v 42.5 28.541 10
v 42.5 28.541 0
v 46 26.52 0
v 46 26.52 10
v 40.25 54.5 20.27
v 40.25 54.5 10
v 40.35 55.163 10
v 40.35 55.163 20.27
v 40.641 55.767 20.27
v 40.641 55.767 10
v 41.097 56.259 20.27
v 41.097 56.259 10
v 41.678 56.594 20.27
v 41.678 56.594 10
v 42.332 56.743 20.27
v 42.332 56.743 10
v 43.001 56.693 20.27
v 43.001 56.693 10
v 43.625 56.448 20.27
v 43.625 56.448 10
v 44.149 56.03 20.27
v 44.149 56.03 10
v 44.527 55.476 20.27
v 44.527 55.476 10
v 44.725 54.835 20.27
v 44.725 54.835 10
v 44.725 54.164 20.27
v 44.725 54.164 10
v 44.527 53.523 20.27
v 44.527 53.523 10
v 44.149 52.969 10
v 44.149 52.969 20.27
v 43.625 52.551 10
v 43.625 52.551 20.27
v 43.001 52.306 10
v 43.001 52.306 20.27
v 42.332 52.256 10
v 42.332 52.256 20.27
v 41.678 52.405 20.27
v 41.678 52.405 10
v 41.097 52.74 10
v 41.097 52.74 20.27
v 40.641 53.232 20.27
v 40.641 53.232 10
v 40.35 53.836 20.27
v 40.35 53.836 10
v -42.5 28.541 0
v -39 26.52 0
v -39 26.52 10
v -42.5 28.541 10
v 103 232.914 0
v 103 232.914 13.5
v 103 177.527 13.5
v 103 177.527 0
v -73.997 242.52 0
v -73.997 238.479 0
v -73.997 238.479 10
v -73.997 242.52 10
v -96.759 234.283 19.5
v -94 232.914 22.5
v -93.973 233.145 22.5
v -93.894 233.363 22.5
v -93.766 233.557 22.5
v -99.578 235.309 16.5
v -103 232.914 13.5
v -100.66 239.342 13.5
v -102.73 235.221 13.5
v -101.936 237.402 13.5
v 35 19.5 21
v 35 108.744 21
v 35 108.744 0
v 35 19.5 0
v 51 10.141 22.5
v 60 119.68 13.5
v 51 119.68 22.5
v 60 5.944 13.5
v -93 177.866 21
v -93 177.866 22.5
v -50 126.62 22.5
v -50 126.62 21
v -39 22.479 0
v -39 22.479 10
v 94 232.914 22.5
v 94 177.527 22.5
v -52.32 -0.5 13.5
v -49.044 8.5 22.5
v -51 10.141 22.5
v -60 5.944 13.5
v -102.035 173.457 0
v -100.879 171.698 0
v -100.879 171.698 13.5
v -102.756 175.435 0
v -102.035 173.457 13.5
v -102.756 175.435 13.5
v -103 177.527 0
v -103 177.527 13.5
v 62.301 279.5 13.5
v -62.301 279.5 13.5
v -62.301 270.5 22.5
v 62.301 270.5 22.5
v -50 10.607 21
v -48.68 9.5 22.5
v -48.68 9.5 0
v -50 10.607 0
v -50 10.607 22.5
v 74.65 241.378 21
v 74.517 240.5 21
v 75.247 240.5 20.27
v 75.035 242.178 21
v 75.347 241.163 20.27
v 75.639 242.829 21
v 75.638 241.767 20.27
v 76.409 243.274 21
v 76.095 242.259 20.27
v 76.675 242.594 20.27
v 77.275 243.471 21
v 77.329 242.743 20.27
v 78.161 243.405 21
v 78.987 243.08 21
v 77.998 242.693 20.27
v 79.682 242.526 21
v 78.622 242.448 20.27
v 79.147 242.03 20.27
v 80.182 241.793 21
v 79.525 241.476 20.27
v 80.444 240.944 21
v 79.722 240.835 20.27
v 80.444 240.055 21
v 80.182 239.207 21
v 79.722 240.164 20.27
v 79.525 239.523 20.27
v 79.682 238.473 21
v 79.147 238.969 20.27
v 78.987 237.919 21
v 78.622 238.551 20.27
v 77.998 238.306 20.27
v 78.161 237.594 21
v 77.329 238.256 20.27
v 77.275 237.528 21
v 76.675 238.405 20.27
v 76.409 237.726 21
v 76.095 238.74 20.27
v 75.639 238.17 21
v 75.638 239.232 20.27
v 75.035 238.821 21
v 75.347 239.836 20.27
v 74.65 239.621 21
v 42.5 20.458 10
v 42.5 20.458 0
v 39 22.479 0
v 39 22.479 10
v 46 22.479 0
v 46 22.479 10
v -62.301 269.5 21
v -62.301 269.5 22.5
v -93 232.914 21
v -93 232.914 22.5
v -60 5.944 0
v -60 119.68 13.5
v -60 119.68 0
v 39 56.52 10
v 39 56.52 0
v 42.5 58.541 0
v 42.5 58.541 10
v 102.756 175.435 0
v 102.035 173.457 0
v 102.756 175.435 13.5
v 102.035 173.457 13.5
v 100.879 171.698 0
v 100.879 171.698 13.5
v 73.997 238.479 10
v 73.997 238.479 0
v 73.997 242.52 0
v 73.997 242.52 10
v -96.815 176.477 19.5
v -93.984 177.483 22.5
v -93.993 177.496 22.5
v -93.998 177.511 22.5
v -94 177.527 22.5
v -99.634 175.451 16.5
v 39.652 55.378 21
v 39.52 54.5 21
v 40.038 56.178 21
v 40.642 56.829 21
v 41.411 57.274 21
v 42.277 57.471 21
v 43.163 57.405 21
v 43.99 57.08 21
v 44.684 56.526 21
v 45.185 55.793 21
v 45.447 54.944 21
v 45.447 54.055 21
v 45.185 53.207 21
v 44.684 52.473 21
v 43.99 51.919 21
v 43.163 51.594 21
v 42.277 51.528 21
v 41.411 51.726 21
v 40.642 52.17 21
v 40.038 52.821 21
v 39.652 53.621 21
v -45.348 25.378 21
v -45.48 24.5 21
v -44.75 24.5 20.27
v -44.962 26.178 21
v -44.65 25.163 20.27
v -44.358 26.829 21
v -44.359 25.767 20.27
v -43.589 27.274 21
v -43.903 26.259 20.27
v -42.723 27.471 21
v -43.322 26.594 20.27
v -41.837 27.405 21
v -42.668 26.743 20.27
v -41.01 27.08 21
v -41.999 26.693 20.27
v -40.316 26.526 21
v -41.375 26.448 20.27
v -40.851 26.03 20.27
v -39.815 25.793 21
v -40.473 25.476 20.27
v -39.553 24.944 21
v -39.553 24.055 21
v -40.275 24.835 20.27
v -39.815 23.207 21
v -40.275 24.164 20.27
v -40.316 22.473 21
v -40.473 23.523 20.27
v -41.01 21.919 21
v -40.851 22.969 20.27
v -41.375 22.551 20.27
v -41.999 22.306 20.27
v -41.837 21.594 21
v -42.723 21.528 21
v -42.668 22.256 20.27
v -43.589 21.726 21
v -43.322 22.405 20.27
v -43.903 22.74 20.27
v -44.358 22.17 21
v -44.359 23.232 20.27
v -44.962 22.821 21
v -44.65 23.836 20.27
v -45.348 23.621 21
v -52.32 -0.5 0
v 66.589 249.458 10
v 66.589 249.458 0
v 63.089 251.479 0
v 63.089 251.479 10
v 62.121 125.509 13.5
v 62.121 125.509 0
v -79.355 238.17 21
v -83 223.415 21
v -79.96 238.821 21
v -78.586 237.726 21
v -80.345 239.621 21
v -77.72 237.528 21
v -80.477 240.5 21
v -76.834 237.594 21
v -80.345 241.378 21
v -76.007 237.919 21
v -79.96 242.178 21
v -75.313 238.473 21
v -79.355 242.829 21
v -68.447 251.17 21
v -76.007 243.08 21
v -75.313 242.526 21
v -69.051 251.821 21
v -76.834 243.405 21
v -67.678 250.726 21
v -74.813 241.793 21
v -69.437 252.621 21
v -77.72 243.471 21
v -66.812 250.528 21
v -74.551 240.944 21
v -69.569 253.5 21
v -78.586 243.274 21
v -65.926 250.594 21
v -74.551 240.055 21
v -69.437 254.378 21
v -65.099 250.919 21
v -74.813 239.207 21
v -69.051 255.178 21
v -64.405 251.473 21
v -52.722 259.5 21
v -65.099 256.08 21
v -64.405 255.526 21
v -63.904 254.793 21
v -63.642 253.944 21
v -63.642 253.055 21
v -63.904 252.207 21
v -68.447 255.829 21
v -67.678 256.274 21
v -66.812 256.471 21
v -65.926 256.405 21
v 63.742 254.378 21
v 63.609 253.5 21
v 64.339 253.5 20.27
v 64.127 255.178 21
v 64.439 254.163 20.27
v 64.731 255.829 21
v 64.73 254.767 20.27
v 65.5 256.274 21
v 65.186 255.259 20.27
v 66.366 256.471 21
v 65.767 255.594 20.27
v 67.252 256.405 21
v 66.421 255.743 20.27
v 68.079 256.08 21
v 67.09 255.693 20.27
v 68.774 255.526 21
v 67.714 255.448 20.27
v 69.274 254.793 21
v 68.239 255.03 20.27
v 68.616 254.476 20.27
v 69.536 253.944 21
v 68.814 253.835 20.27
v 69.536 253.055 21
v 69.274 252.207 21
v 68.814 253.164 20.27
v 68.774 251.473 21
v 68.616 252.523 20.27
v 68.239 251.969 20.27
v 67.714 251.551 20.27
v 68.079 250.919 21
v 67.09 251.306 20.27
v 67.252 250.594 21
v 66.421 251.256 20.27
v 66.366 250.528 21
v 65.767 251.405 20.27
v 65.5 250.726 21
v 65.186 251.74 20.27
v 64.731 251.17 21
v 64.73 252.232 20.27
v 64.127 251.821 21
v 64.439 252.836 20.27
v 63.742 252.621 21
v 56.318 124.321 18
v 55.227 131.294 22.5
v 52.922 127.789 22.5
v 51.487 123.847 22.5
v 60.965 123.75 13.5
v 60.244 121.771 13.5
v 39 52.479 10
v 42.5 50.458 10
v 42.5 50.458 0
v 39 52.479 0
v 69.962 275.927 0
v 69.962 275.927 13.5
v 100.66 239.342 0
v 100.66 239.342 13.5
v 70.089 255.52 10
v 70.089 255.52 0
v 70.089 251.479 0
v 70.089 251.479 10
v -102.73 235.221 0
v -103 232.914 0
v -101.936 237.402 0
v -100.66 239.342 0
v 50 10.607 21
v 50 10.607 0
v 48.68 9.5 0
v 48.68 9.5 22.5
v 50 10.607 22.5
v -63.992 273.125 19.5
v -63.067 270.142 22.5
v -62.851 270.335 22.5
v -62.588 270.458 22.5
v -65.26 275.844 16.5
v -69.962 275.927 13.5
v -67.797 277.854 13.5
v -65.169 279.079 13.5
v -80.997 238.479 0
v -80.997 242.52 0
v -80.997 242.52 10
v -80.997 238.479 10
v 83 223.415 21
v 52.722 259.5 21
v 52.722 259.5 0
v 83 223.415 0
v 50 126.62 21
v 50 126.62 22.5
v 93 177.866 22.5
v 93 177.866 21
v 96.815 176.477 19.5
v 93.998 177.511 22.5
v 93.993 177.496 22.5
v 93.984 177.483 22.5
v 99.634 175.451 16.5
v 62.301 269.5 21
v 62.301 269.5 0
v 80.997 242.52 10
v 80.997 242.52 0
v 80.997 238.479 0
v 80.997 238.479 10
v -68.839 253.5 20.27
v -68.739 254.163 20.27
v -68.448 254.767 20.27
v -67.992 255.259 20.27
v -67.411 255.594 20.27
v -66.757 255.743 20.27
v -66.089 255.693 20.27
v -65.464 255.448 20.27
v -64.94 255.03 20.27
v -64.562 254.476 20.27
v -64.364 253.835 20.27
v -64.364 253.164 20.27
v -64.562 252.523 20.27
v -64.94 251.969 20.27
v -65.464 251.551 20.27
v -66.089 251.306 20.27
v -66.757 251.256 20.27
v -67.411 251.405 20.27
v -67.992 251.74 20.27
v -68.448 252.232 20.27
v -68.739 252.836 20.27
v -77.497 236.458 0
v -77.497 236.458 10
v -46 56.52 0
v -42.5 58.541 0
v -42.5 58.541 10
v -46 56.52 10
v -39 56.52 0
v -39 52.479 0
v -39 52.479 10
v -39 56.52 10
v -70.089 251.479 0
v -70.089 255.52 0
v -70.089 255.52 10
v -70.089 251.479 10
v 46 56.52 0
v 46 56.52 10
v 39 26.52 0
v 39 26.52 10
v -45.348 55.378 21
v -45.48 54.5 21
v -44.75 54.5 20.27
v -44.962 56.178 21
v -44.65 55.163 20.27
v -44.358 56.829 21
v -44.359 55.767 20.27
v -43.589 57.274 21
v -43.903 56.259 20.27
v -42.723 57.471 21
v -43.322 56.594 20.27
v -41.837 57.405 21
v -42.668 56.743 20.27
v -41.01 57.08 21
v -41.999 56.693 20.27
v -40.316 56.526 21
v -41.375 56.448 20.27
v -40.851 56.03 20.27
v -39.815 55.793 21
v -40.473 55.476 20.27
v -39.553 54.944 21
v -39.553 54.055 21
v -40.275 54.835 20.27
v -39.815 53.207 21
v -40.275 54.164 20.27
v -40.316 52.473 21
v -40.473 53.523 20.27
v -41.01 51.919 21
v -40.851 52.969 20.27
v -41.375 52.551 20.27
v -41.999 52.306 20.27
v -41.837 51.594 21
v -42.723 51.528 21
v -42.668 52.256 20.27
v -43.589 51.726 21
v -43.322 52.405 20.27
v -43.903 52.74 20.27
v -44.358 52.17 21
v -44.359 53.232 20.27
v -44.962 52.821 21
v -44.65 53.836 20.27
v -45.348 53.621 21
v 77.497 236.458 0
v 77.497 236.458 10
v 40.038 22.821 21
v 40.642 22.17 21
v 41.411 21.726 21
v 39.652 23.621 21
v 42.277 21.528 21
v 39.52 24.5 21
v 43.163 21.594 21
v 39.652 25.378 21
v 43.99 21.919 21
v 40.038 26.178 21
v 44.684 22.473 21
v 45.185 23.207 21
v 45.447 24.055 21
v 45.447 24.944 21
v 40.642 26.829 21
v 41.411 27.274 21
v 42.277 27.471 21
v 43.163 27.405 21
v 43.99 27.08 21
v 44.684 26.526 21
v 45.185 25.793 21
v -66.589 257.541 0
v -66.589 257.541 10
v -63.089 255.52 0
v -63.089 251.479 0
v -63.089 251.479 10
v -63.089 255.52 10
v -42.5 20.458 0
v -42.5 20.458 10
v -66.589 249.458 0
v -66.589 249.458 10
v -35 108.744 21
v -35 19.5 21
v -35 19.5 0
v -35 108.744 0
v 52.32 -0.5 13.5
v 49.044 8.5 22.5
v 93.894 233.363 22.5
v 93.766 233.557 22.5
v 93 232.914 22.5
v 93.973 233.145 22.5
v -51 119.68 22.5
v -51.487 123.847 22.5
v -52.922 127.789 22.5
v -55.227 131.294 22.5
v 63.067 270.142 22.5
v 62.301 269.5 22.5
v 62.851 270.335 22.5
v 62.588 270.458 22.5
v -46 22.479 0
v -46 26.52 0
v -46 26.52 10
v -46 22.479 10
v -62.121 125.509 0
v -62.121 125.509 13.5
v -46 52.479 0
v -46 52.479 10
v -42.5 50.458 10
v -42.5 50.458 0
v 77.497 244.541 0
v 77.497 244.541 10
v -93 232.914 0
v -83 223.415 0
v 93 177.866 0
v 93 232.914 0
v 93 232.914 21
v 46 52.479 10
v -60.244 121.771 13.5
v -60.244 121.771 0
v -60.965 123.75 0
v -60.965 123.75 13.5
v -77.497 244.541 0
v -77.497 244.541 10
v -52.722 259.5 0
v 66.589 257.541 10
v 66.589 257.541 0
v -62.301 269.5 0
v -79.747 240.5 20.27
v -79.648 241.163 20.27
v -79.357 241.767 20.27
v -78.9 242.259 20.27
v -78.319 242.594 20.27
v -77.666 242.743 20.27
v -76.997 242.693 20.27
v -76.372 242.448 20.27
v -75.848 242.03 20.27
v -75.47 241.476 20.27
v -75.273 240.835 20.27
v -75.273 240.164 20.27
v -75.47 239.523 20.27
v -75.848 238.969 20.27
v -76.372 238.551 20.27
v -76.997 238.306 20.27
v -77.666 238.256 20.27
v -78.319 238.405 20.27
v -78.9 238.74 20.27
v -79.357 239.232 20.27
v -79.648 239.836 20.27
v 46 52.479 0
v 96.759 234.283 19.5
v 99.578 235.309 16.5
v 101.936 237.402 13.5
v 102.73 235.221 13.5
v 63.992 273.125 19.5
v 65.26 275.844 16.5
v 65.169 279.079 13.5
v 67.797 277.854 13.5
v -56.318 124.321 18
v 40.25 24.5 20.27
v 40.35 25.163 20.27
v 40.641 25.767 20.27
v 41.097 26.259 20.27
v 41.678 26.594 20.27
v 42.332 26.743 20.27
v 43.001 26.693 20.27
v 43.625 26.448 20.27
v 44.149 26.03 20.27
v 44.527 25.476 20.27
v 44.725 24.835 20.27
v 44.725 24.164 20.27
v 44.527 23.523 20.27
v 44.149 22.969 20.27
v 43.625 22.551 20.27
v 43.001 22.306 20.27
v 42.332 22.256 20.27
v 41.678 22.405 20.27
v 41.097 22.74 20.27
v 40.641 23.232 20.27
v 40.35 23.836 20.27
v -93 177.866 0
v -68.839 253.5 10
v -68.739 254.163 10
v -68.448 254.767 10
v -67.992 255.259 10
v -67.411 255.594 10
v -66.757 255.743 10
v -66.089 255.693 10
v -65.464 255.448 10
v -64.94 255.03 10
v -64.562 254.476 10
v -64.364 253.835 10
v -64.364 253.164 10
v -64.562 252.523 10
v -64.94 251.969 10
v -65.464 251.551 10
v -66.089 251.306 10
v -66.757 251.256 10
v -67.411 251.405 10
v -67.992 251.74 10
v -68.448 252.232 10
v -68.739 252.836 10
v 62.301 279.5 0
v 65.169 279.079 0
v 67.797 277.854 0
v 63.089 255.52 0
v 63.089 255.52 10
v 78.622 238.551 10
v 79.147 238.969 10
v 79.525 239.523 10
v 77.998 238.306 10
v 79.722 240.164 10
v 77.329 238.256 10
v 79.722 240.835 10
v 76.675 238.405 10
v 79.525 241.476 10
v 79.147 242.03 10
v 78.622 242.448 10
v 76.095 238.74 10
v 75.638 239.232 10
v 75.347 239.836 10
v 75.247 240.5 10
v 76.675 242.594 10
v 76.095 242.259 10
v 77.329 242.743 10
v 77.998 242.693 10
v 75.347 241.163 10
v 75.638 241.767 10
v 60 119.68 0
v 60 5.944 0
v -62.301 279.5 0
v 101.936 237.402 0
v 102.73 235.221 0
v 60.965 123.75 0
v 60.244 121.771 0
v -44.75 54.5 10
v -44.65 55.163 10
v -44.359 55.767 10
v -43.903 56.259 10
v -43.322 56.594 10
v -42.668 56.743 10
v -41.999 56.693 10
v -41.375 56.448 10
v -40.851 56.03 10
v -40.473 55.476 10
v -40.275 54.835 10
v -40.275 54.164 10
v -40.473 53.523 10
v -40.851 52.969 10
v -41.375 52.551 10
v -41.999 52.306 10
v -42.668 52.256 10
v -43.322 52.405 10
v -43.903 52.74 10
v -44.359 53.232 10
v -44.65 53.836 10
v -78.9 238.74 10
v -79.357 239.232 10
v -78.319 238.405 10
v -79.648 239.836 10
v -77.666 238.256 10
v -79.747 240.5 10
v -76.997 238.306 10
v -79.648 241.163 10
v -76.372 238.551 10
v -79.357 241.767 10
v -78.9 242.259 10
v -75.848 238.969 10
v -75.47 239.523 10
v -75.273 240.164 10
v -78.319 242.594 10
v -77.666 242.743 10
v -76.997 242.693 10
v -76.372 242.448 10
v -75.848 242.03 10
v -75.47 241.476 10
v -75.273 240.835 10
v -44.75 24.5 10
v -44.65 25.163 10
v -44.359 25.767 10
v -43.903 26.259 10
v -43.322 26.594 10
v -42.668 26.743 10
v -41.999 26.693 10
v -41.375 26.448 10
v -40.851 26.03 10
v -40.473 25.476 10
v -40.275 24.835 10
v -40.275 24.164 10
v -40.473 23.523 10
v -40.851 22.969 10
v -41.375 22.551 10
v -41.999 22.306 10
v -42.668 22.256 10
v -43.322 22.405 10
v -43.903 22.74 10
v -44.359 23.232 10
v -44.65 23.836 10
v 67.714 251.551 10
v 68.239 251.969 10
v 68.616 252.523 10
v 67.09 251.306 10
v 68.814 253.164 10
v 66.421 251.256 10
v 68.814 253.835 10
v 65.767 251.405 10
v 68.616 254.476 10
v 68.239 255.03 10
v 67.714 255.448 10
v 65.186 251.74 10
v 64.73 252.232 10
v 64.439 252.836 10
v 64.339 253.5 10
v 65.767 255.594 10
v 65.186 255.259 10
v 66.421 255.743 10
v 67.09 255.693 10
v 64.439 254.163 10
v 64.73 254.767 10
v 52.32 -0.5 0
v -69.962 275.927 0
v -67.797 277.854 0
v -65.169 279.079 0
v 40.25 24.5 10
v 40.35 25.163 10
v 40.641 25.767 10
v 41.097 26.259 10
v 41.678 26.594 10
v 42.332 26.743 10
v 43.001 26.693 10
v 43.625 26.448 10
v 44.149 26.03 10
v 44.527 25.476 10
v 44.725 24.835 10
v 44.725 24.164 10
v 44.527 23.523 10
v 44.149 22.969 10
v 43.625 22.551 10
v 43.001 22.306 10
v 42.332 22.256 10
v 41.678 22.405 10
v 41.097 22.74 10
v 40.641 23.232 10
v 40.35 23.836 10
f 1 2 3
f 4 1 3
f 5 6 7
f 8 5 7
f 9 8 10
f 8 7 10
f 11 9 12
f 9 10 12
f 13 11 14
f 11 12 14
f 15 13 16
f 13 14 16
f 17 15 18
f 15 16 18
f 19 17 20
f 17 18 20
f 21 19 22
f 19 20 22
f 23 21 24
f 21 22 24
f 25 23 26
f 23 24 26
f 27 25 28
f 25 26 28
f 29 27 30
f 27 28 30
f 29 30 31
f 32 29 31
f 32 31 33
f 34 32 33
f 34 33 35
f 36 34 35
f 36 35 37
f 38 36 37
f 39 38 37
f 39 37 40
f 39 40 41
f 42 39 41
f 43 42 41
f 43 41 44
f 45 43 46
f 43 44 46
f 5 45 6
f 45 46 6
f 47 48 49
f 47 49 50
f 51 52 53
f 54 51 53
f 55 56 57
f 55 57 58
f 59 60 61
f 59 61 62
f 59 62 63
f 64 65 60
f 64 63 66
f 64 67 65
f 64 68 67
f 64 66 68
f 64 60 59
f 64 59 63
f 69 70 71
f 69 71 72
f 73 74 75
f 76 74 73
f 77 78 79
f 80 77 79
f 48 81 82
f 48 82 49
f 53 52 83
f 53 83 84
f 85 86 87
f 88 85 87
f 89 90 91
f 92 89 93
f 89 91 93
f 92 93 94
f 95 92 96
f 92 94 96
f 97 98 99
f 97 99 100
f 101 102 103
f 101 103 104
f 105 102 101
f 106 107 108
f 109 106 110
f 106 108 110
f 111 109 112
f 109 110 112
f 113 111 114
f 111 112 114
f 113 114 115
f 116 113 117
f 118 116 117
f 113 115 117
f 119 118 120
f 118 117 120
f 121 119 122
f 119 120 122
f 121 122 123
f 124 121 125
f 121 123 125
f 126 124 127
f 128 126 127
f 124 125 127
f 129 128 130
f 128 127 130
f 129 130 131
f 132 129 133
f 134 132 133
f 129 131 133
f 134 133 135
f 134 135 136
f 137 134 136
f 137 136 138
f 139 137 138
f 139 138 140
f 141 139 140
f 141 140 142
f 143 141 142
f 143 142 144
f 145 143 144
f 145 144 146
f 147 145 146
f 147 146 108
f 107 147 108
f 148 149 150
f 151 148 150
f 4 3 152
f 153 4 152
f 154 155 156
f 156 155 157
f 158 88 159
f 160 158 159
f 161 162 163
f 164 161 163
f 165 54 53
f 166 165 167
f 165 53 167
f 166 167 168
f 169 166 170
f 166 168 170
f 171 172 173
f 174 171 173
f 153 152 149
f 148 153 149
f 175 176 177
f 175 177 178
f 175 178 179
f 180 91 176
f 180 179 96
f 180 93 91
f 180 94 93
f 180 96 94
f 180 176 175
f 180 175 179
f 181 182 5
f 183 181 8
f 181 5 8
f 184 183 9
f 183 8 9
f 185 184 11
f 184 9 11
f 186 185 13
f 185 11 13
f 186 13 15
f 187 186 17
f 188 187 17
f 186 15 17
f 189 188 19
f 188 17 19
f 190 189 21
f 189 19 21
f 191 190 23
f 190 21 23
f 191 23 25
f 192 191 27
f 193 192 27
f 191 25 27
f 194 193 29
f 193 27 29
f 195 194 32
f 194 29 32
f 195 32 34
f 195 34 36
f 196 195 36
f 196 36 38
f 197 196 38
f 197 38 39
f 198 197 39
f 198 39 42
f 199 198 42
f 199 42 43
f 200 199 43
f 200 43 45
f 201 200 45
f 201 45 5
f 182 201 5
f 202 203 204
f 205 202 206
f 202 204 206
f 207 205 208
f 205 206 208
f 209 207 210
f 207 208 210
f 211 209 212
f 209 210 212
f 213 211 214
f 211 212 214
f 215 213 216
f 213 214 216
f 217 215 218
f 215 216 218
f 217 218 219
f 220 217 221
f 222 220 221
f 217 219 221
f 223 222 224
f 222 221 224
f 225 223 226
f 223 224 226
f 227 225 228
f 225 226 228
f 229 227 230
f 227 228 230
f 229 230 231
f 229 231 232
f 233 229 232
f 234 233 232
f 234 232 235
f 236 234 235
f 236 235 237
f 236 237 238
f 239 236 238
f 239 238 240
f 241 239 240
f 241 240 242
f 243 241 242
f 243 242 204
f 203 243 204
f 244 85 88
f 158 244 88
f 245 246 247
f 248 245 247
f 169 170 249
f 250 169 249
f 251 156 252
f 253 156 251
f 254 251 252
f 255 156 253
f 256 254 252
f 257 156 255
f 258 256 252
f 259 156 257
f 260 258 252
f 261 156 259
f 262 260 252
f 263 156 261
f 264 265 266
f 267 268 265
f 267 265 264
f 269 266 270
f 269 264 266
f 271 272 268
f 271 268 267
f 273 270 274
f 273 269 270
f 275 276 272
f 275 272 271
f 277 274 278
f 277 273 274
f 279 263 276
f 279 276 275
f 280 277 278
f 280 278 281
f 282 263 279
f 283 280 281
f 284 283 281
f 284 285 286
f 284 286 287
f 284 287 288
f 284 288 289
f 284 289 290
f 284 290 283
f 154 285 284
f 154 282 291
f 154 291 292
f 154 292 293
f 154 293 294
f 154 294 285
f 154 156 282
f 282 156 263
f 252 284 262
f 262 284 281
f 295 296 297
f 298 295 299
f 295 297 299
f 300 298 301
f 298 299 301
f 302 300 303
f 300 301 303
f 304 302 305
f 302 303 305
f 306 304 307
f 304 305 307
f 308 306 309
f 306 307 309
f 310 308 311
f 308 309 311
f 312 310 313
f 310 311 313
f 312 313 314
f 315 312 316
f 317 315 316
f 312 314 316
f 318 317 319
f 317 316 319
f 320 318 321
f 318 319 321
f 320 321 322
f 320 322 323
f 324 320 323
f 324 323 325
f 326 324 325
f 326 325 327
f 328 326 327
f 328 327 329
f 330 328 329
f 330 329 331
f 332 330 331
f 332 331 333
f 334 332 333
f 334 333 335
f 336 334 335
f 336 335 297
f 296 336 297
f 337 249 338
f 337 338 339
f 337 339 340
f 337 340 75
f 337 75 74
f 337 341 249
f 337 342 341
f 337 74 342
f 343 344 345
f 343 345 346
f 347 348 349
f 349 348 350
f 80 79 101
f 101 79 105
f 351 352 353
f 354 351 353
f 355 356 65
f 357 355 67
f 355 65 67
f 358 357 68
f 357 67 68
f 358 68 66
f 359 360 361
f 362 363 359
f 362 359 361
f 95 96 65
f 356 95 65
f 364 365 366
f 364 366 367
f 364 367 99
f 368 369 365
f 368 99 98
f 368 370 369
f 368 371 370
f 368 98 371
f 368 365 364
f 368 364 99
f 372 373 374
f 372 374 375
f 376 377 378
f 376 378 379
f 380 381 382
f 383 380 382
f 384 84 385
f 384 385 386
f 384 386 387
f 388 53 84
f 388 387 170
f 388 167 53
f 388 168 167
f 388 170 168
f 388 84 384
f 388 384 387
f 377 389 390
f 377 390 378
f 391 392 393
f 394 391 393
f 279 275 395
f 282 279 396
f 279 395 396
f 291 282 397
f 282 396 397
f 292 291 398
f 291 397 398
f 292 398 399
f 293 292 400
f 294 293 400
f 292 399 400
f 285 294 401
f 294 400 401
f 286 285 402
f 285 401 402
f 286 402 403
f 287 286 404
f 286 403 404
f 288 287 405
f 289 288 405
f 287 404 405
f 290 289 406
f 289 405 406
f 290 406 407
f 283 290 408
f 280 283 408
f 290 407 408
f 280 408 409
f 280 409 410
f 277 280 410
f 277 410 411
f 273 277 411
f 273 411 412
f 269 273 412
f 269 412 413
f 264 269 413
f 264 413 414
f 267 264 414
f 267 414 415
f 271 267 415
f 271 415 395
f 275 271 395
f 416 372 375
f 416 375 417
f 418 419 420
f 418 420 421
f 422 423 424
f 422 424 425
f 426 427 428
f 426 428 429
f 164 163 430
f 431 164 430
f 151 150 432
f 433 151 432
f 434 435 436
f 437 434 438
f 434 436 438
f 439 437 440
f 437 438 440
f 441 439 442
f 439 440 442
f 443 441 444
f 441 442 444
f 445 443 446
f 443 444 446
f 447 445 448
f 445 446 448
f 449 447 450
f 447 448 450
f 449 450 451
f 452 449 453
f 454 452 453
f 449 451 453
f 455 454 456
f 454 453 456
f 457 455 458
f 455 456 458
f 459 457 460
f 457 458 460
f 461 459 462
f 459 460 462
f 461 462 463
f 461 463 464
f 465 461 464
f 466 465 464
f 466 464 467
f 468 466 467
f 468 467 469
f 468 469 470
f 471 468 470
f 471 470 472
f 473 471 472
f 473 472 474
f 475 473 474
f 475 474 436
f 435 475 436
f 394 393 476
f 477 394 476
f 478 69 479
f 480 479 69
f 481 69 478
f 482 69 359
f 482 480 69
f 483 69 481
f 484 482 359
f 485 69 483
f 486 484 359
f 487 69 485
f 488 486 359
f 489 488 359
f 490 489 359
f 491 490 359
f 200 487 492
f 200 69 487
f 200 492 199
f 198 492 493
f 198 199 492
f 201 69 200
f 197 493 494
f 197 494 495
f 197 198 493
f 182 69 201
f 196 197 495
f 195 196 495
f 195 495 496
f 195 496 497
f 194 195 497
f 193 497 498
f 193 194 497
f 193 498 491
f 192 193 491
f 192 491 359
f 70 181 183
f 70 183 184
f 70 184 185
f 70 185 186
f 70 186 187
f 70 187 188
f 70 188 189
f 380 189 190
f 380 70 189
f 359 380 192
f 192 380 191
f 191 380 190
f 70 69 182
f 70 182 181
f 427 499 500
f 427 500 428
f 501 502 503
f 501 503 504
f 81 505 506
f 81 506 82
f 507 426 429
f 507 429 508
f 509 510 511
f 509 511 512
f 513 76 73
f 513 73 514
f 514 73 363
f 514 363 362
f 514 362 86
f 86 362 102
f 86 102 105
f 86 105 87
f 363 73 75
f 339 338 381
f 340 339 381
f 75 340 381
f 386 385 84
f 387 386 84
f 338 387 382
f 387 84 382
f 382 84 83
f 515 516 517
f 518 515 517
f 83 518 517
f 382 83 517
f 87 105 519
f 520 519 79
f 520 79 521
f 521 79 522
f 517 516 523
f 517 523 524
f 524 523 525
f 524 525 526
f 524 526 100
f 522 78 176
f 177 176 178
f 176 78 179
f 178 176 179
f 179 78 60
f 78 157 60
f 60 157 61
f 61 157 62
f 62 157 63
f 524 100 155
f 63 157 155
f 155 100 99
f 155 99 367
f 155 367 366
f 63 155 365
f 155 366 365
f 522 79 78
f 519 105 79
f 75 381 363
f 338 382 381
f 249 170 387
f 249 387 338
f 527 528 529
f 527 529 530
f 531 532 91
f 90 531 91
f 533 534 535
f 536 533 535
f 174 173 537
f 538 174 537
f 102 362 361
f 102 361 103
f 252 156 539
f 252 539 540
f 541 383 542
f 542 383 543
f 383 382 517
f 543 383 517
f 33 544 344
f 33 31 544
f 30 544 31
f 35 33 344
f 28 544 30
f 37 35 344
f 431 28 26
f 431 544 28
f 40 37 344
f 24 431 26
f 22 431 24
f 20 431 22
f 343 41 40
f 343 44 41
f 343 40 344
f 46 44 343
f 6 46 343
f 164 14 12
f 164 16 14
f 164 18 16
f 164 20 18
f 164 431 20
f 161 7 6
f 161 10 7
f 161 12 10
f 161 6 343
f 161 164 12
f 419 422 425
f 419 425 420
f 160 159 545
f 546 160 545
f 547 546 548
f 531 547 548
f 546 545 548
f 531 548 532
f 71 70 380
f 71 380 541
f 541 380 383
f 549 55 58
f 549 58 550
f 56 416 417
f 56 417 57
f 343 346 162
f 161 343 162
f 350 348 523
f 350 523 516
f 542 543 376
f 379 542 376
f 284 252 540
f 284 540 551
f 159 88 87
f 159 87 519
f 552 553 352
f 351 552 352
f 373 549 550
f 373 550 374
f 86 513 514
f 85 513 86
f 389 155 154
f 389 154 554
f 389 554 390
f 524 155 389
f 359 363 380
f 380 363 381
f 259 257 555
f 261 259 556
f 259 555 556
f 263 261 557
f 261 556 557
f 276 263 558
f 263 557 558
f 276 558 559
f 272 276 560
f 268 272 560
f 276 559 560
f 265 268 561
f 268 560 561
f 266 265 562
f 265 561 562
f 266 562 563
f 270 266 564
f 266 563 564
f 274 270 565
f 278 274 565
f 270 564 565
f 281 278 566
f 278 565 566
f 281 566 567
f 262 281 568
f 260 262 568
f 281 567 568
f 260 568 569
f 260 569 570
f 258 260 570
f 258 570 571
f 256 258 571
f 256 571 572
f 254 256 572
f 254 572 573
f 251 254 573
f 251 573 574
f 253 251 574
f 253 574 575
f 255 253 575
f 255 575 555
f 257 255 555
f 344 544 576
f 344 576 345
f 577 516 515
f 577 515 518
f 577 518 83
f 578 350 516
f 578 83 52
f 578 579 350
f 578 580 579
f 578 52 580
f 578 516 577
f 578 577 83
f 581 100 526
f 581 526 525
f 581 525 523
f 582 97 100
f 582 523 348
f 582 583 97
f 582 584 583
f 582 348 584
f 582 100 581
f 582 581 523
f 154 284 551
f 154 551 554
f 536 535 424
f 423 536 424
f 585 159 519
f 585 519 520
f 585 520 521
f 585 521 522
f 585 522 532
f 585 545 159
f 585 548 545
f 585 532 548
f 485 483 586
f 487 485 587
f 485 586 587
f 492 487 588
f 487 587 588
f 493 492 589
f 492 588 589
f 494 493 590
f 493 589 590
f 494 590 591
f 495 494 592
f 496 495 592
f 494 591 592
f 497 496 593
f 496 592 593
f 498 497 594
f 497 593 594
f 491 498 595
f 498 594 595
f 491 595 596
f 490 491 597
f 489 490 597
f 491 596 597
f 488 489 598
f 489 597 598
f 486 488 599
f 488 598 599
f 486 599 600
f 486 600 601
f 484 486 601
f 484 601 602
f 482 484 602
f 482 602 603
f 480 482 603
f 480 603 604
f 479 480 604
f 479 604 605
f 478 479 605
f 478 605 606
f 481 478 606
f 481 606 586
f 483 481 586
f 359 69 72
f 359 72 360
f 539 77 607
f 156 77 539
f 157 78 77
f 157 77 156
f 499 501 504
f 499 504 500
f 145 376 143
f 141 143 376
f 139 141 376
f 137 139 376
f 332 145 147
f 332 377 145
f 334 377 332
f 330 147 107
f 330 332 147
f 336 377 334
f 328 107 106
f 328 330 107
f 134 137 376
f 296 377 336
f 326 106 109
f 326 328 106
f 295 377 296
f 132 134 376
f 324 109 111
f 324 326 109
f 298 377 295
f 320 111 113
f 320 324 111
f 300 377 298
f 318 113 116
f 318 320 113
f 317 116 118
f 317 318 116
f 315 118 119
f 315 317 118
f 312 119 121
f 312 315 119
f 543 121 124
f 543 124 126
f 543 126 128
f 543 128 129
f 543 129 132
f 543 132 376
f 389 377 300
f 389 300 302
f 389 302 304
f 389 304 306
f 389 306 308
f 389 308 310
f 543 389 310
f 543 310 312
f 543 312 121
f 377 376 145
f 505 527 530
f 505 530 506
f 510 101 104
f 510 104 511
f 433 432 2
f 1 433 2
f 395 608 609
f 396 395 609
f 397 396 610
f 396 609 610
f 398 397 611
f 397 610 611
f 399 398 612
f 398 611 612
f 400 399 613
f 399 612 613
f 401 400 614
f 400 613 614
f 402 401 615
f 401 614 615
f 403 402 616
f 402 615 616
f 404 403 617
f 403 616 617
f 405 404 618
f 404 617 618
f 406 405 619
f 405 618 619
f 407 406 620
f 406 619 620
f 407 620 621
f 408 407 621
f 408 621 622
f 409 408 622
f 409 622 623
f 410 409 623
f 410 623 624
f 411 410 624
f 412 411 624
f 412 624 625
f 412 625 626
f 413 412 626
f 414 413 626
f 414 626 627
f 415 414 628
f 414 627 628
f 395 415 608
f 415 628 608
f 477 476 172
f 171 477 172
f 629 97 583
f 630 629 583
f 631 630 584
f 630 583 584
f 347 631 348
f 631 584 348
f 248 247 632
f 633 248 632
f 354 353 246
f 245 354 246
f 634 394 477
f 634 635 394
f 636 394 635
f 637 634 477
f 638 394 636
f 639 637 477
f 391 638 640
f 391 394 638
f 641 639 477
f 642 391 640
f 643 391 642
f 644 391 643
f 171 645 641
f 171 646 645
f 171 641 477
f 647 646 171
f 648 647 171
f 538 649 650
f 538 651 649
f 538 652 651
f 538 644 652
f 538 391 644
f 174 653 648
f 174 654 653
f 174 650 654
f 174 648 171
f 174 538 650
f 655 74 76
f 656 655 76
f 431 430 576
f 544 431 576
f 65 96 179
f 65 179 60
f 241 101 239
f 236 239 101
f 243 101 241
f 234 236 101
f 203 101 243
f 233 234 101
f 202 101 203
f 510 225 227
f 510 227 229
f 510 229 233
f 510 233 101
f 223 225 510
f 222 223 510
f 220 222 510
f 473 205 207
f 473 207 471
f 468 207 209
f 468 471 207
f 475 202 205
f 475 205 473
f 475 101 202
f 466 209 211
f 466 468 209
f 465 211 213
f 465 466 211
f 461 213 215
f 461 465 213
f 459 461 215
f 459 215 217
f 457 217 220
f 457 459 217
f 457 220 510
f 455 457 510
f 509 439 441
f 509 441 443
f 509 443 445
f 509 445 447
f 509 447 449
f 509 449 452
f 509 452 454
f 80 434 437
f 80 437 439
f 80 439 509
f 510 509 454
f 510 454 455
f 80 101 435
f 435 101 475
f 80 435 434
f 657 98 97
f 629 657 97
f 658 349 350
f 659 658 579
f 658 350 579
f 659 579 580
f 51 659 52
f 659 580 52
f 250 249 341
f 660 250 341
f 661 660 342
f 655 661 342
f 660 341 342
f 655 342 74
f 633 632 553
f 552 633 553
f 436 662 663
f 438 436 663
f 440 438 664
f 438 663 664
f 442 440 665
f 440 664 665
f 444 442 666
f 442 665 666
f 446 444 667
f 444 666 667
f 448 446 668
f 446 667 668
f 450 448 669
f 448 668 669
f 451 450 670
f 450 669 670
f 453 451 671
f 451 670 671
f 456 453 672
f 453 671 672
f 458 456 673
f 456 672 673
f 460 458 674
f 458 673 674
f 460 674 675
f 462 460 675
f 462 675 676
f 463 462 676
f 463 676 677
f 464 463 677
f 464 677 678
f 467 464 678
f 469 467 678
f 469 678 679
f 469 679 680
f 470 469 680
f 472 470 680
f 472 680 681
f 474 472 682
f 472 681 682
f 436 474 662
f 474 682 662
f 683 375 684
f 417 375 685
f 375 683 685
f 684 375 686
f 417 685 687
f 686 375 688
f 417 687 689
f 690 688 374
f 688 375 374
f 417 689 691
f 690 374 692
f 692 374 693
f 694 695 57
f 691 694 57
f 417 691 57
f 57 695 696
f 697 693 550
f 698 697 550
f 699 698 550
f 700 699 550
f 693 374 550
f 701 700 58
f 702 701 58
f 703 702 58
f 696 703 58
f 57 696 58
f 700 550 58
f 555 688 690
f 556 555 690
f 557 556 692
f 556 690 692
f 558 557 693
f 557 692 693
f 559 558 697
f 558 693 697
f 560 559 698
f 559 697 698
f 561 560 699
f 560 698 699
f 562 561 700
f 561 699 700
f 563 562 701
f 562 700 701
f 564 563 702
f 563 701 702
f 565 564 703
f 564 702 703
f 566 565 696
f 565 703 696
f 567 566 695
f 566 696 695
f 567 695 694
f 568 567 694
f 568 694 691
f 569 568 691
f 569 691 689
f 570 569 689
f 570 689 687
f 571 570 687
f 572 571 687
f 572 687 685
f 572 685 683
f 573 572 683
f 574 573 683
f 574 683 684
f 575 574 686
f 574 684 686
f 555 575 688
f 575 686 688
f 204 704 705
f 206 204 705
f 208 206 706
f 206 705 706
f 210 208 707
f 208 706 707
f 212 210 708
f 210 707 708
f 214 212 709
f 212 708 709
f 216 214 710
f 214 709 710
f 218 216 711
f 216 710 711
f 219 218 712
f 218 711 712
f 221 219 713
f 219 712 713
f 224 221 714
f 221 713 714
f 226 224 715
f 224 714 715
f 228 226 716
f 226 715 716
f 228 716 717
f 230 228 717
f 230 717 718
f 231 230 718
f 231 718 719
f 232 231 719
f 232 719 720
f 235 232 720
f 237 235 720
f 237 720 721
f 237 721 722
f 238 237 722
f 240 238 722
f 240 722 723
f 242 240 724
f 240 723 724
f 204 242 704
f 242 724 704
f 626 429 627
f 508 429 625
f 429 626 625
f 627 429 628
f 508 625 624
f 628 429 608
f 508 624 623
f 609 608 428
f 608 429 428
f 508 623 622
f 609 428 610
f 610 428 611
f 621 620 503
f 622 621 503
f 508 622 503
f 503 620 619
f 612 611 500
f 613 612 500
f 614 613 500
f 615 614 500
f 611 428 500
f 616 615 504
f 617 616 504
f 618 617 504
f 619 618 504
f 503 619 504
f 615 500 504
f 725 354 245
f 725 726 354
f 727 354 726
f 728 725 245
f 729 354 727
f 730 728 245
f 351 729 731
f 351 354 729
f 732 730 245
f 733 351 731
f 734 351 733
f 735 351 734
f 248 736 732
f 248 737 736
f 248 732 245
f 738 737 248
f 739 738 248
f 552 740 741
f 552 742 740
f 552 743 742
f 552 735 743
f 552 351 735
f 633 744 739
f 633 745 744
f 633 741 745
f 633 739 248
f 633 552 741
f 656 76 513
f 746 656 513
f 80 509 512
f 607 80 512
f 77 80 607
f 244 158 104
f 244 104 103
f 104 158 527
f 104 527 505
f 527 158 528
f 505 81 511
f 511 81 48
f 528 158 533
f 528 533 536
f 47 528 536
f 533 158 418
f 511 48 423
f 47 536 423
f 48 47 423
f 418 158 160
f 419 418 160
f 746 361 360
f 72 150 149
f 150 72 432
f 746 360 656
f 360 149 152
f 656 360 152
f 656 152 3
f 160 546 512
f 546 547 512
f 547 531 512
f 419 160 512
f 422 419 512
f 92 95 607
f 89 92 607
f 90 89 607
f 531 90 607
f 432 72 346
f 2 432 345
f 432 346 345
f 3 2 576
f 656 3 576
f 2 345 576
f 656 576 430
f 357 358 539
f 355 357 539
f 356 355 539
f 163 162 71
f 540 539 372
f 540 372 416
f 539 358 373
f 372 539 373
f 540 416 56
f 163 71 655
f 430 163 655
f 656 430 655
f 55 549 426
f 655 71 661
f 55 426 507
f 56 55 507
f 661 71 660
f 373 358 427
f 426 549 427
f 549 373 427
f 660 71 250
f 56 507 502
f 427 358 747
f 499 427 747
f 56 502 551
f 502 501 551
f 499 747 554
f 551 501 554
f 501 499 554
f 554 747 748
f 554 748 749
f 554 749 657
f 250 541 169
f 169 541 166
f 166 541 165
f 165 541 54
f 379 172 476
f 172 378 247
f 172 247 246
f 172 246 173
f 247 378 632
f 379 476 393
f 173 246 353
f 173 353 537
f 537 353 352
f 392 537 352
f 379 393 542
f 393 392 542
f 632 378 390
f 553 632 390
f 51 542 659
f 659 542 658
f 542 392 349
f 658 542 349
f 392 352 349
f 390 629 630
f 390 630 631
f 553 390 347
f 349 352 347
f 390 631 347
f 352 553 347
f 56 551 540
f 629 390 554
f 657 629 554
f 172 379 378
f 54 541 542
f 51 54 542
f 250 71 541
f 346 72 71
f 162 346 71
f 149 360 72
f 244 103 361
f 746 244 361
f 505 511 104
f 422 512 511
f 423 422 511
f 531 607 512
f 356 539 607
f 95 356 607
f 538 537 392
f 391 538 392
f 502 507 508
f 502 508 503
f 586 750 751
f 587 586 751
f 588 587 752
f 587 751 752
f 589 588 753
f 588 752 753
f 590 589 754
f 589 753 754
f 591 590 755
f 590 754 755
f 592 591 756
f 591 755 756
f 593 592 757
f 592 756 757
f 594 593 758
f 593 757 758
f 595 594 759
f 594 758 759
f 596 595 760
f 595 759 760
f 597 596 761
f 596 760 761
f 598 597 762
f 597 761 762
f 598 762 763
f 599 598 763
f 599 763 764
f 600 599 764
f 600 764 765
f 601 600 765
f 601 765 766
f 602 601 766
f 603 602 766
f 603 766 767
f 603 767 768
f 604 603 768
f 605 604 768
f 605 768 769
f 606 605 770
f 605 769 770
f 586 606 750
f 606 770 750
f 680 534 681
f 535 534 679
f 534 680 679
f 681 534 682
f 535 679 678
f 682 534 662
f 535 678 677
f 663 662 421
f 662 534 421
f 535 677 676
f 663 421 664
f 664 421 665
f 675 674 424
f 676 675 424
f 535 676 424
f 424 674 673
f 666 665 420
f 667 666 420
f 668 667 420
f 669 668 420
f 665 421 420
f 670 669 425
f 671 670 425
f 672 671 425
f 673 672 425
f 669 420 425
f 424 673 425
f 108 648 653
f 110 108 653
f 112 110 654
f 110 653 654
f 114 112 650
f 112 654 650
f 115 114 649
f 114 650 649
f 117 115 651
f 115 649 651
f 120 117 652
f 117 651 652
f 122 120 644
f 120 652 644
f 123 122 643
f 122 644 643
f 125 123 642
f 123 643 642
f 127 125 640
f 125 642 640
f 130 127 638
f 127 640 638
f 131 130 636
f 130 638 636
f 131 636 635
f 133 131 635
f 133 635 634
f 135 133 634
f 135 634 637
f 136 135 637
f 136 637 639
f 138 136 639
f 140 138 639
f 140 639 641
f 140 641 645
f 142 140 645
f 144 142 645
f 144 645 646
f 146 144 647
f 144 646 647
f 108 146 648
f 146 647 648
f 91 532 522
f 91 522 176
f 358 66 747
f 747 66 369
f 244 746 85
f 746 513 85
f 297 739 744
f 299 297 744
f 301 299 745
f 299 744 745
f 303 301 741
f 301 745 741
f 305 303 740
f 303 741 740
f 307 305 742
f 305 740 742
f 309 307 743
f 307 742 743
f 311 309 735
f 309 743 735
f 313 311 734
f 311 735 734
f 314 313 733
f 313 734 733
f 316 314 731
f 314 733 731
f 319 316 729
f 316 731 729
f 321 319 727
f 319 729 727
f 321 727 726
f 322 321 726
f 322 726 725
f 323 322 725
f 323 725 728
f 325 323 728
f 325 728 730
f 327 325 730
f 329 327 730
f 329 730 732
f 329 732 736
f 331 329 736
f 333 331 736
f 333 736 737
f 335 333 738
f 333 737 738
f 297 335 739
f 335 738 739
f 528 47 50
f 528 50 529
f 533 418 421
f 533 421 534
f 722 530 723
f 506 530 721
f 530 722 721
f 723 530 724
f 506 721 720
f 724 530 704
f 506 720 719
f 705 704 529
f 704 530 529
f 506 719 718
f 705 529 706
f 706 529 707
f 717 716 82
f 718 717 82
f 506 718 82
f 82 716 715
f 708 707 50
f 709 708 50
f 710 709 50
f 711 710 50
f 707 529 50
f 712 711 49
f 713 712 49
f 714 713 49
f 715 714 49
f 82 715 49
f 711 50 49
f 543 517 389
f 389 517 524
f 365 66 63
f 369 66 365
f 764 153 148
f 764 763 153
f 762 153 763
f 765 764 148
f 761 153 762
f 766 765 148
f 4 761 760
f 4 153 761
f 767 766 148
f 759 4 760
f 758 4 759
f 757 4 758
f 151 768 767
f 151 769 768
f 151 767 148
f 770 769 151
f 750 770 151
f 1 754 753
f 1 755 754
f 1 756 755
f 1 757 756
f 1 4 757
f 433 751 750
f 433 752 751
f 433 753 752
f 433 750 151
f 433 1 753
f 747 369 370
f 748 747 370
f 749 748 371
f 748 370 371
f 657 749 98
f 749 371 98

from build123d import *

# Parameters (mm, degrees)
RESSALTO_EXTRUS_O1_DEPTH                            = 22.5
CHANFRO1_SIZE                                       = 9
CORTE_EXTRUS_O1_REACH                               = 24.5
ESBO_O3_W                                           = 1139.230904301
ESBO_O3_H                                           = 709.798033895
CORTE_EXTRUS_O5_DEPTH                               = 1.5
CORTE_EXTRUS_O6_REACH                               = 23
ESCAREADO_PARA_PARAFUSO_ALLEN_SEXTAVADO_D           = 4.5
ESCAREADO_PARA_PARAFUSO_ALLEN_SEXTAVADO_CSINK_D     = 8.96
ESCAREADO_PARA_PARAFUSO_ALLEN_SEXTAVADO_CSINK_ANGLE = 90
CORTE_EXTRUS_O7_DEPTH                               = 10


with BuildPart() as part:
    # Esboço1 → Ressalto-extrusão1 (new body, symmetric)
    with BuildSketch(Plane.XY):
        with BuildLine():
            Line((-62.301435521, 279.499553668), (62.301435521, 279.499553668))
            ThreePointArc((62.301435521, 279.499553668), (66.527618138, 278.562631538), (69.961879952, 275.927429764))
            Line((69.961879952, 275.927429764), (100.660444431, 239.342305259))
            ThreePointArc((100.660444431, 239.342305259), (102.396926208, 236.334630596), (103, 232.914429162))
            Line((103, 232.914429162), (103, 177.526516487))
            ThreePointArc((103, 177.526516487), (102.453136861, 174.425101506), (100.878507208, 171.697762944))
            Line((100.878507208, 171.697762944), (62.121492792, 125.508951777))
            ThreePointArc((62.121492792, 125.508951777), (60.546863139, 122.781613215), (60, 119.680198234))
            Line((60, 119.680198234), (60, 5.944191717))
            Line((60, 5.944191717), (52.319579452, -0.500446332))
            Line((52.319579452, -0.500446332), (-52.319579452, -0.500446332))
            Line((-52.319579452, -0.500446332), (-60, 5.944191717))
            Line((-60, 5.944191717), (-60, 119.680198234))
            ThreePointArc((-60, 119.680198234), (-60.546863139, 122.781613215), (-62.121492792, 125.508951777))
            Line((-62.121492792, 125.508951777), (-100.878507208, 171.697762944))
            ThreePointArc((-100.878507208, 171.697762944), (-102.453136861, 174.425101506), (-103, 177.526516487))
            Line((-103, 177.526516487), (-103, 232.914429162))
            ThreePointArc((-103, 232.914429162), (-102.396926208, 236.334630596), (-100.660444431, 239.342305259))
            Line((-100.660444431, 239.342305259), (-69.961879952, 275.927429764))
            ThreePointArc((-69.961879952, 275.927429764), (-66.527618138, 278.562631538), (-62.301435521, 279.499553668))
        make_face()
        Polygon((-52.721623425, 259.499553668), (52.721623425, 259.499553668), (83, 223.415189606), (83, 181.505464287), (35, 124.301291842), (35, 19.499553668), (-35, 19.499553668), (-35, 124.301291842), (-83, 181.505464287), (-83, 223.415189606), align=None, mode=Mode.SUBTRACT)
    extrude(amount=RESSALTO_EXTRUS_O1_DEPTH, both=True)

    # Chanfro1
    chanfro1_edges = [part.edges().sort_by_distance(p)[0] for p in [
        (0, -0.500446332, 22.5),
        (56.159789726, 2.721872692, 22.5),
        (60, 62.812194975, 22.5),
        (60.546863139, 122.781613215, 22.5),
        (81.5, 148.603357361, 22.5),
        (102.453136861, 174.425101506, 22.5),
        (103, 205.220472825, 22.5),
        (102.396926208, 236.334630596, 22.5),
        (85.311162192, 257.634867512, 22.5),
        (66.527618138, 278.562631538, 22.5),
        (0, 279.499553668, 22.5),
        (-66.527618138, 278.562631538, 22.5),
        (-85.311162192, 257.634867512, 22.5),
        (-102.396926208, 236.334630596, 22.5),
        (-103, 205.220472825, 22.5),
        (-102.453136861, 174.425101506, 22.5),
        (-81.5, 148.603357361, 22.5),
        (-60.546863139, 122.781613215, 22.5),
        (-60, 62.812194975, 22.5),
        (-56.159789726, 2.721872692, 22.5),
    ]]
    chamfer(chanfro1_edges, length=CHANFRO1_SIZE)

    # Esboço3 → Corte-extrusão1 (cut, up to next)
    with BuildSketch(Plane.XY, mode=Mode.PRIVATE) as corte_extrus_o1_sk1:
        with Locations((-153.157436203, 152.53565808)):
            Rectangle(ESBO_O3_W, ESBO_O3_H)
    corte_extrus_o1_tool1 = extrude(corte_extrus_o1_sk1.sketch, amount=-CORTE_EXTRUS_O1_REACH, mode=Mode.PRIVATE) & part.part
    add(corte_extrus_o1_tool1.solids().sort_by_distance((-153.157436, 152.535658, 0))[0], mode=Mode.SUBTRACT)

    # Esboço4 → Corte-extrusão5 (cut)
    with BuildSketch(Plane.XY.offset(22.5)):
        Polygon((62.301435521, 269.499553668), (-62.301435521, 269.499553668), (-93, 232.914429162), (-93, 177.865761944), (-50, 126.620357463), (-50, 10.607268298), (-48.679877109, 9.499553668), (48.679877109, 9.499553668), (50, 10.607268298), (50, 126.620357463), (93, 177.865761944), (93, 232.914429162), align=None)
        Polygon((35, 19.499553668), (-35, 19.499553668), (-35, 124.301291842), (-83, 181.505464287), (-83, 223.415189606), (-52.721623425, 259.499553668), (52.721623425, 259.499553668), (83, 223.415189606), (83, 181.505464287), (35, 124.301291842), align=None, mode=Mode.SUBTRACT)
    extrude(amount=-CORTE_EXTRUS_O5_DEPTH, mode=Mode.SUBTRACT)

    # Esboço5 → Corte-extrusão6 (cut, up to next)
    with BuildSketch(Plane.XY.offset(21), mode=Mode.PRIVATE) as corte_extrus_o6_sk1:
        Polygon((-93, 232.914429162), (-83, 223.415189606), (-83, 181.505464287), (-35, 124.301291842), (-35, 108.744053574), (-93, 177.865761944), align=None)
    corte_extrus_o6_tool1 = extrude(corte_extrus_o6_sk1.sketch, amount=-CORTE_EXTRUS_O6_REACH, mode=Mode.PRIVATE) & part.part
    add(corte_extrus_o6_tool1.solids().sort_by_distance((-88.943881, 227.171171, 21))[0], mode=Mode.SUBTRACT)
    # Esboço5 → Corte-extrusão6 (cut, up to next)
    with BuildSketch(Plane.XY.offset(21), mode=Mode.PRIVATE) as corte_extrus_o6_sk2:
        Polygon((-52.721623425, 259.499553668), (-62.301435521, 269.499553668), (62.301435521, 269.499553668), (52.721623425, 259.499553668), align=None)
    corte_extrus_o6_tool2 = extrude(corte_extrus_o6_sk2.sketch, amount=-CORTE_EXTRUS_O6_REACH, mode=Mode.PRIVATE) & part.part
    add(corte_extrus_o6_tool2.solids().sort_by_distance((0, 264.638364, 21))[0], mode=Mode.SUBTRACT)
    # Esboço5 → Corte-extrusão6 (cut, up to next)
    with BuildSketch(Plane.XY.offset(21), mode=Mode.PRIVATE) as corte_extrus_o6_sk3:
        Polygon((-50, 10.607268298), (-35, 19.499553668), (35, 19.499553668), (50, 10.607268298), (48.679877109, 9.499553668), (-48.679877109, 9.499553668), align=None)
    corte_extrus_o6_tool3 = extrude(corte_extrus_o6_sk3.sketch, amount=-CORTE_EXTRUS_O6_REACH, mode=Mode.PRIVATE) & part.part
    add(corte_extrus_o6_tool3.solids().sort_by_distance((0, 14.193497, 21))[0], mode=Mode.SUBTRACT)
    # Esboço5 → Corte-extrusão6 (cut, up to next)
    with BuildSketch(Plane.XY.offset(21), mode=Mode.PRIVATE) as corte_extrus_o6_sk4:
        Polygon((35, 108.744053574), (93, 177.865761944), (93, 232.914429162), (83, 223.415189606), (83, 181.505464287), (35, 124.301291842), align=None)
    corte_extrus_o6_tool4 = extrude(corte_extrus_o6_sk4.sketch, amount=-CORTE_EXTRUS_O6_REACH, mode=Mode.PRIVATE) & part.part
    add(corte_extrus_o6_tool4.solids().sort_by_distance((62.950148, 144.185838, 21))[0], mode=Mode.SUBTRACT)

    # Escareado para parafuso Allen sextavado escareado de M41 (through all)
    with Locations(Plane(origin=(-66.589178595, 253.499553668, 22.5), x_dir=(1, 0, 0), z_dir=(0, 0, 1))):
        with Locations((0, 0), (-10.908295205, -13), (133.17835719, 0), (144.086652395, -13), (24.089178595, -199), (24.089178595, -229), (109.089178595, -229), (109.089178595, -199)):
            CounterSinkHole(ESCAREADO_PARA_PARAFUSO_ALLEN_SEXTAVADO_D / 2, ESCAREADO_PARA_PARAFUSO_ALLEN_SEXTAVADO_CSINK_D / 2, counter_sink_angle=ESCAREADO_PARA_PARAFUSO_ALLEN_SEXTAVADO_CSINK_ANGLE)

    # Esboço9 → Corte-extrusão7 (cut)
    with BuildSketch(Plane(origin=(0, 0, 0), x_dir=(-1, 0, 0), z_dir=(0, 0, -1))):
        Polygon((-66.589178595, 257.541005552), (-70.089178595, 255.52027961), (-70.089178595, 251.478827725), (-66.589178595, 249.458101783), (-63.089178595, 251.478827725), (-63.089178595, 255.52027961), align=None)
        Polygon((-77.4974738, 244.541005552), (-80.9974738, 242.52027961), (-80.9974738, 238.478827725), (-77.4974738, 236.458101783), (-73.9974738, 238.478827725), (-73.9974738, 242.52027961), align=None)
        Polygon((-42.5, 58.541005552), (-46, 56.52027961), (-46, 52.478827725), (-42.5, 50.458101783), (-39, 52.478827725), (-39, 56.52027961), align=None)
        Polygon((-42.5, 28.541005552), (-46, 26.52027961), (-46, 22.478827725), (-42.5, 20.458101783), (-39, 22.478827725), (-39, 26.52027961), align=None)
        Polygon((39, 26.52027961), (42.5, 28.541005552), (46, 26.52027961), (46, 22.478827725), (42.5, 20.458101783), (39, 22.478827725), align=None)
        Polygon((39, 56.52027961), (42.5, 58.541005552), (46, 56.52027961), (46, 52.478827725), (42.5, 50.458101783), (39, 52.478827725), align=None)
        Polygon((73.9974738, 242.52027961), (77.4974738, 244.541005552), (80.9974738, 242.52027961), (80.9974738, 238.478827725), (77.4974738, 236.458101783), (73.9974738, 238.478827725), align=None)
        Polygon((63.089178595, 255.52027961), (66.589178595, 257.541005552), (70.089178595, 255.52027961), (70.089178595, 251.478827725), (66.589178595, 249.458101783), (63.089178595, 251.478827725), align=None)
    extrude(amount=-CORTE_EXTRUS_O7_DEPTH, mode=Mode.SUBTRACT)


solid = part.part
